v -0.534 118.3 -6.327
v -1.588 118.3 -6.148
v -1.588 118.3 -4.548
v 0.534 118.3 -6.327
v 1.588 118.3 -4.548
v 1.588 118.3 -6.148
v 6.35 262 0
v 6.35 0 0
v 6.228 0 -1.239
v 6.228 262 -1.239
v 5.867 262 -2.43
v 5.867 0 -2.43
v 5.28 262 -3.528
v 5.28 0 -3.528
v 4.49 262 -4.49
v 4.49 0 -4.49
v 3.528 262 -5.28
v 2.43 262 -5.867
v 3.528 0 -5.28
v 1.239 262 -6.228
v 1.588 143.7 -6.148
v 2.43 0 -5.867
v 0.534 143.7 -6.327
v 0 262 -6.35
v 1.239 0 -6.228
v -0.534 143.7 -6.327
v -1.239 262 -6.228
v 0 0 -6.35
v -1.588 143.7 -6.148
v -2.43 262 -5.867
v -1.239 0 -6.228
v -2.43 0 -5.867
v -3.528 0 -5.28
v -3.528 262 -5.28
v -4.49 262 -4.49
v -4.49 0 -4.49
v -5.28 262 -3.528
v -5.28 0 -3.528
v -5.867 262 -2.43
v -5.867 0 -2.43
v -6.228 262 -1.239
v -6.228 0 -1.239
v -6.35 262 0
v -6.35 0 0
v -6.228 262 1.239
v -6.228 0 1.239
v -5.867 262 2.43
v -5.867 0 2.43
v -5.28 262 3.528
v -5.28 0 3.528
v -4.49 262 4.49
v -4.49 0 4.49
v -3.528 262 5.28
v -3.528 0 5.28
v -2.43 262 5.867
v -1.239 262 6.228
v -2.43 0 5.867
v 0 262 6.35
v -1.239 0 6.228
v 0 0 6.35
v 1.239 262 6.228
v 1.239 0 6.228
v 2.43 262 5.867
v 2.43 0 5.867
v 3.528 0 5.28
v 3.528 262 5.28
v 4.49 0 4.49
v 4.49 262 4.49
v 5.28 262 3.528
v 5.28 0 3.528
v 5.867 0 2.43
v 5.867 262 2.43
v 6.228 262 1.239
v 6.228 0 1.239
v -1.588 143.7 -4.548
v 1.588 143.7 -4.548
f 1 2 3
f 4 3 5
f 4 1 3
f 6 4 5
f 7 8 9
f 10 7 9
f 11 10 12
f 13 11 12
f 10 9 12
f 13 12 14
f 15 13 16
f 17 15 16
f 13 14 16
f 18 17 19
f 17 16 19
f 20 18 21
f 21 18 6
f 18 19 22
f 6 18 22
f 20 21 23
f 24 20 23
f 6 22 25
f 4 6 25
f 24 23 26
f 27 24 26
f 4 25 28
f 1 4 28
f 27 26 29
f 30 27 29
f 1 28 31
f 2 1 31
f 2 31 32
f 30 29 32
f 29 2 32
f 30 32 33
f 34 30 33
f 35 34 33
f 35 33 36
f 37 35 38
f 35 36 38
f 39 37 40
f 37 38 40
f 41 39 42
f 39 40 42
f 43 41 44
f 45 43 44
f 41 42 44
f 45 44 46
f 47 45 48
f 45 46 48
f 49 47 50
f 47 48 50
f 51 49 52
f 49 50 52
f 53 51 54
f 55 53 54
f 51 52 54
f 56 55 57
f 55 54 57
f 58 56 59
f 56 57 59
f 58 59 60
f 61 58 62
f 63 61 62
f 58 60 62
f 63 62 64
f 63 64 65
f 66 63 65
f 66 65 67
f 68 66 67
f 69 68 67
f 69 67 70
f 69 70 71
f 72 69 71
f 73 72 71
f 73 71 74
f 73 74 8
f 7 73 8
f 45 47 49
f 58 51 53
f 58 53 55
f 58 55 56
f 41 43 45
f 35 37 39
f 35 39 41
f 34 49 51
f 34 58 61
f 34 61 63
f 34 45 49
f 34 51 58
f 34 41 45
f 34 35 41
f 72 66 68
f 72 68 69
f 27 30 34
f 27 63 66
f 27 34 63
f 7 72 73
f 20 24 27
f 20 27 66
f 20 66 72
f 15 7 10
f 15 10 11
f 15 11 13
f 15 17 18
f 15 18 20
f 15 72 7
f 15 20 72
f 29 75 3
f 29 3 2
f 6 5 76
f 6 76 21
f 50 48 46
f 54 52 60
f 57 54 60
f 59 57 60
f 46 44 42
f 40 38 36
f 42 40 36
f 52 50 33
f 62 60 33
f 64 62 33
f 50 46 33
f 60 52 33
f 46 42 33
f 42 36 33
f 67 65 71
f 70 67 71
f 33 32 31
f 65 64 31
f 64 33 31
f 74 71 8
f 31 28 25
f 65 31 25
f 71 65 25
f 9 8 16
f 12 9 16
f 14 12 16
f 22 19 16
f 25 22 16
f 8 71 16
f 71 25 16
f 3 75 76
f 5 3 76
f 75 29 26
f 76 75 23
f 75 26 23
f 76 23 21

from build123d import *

# Parameters (mm, degrees)
SKETCH1_R               = 6.35
BOSS_EXTRUDE1_DEPTH     = 262
SKETCH2_W               = 3.175
SKETCH2_H               = 3.2004
CUT_EXTRUDE1_DEPTH      = 12.7
CUT_EXTRUDE1_DEPTH_BACK = 12.7


with BuildPart() as part:
    # Sketch1 → Boss-Extrude1 (new body)
    with BuildSketch(Plane(origin=(0, 0, 0), x_dir=(1, 0, 0), z_dir=(0, 1, 0))):
        Circle(SKETCH1_R)
    extrude(amount=BOSS_EXTRUDE1_DEPTH)

    # Sketch2 → Cut-Extrude1 (cut, two sides)
    with BuildSketch(Plane(origin=(0, 131, 0), x_dir=(1, 0, 0), z_dir=(0, 1, 0))) as cut_extrude1_sk:
        with Locations((0, 6.148361062)):
            Rectangle(SKETCH2_W, SKETCH2_H)
    extrude(amount=CUT_EXTRUDE1_DEPTH, mode=Mode.SUBTRACT)
    extrude(cut_extrude1_sk.sketch, amount=-CUT_EXTRUDE1_DEPTH_BACK, mode=Mode.SUBTRACT)


solid = part.part
